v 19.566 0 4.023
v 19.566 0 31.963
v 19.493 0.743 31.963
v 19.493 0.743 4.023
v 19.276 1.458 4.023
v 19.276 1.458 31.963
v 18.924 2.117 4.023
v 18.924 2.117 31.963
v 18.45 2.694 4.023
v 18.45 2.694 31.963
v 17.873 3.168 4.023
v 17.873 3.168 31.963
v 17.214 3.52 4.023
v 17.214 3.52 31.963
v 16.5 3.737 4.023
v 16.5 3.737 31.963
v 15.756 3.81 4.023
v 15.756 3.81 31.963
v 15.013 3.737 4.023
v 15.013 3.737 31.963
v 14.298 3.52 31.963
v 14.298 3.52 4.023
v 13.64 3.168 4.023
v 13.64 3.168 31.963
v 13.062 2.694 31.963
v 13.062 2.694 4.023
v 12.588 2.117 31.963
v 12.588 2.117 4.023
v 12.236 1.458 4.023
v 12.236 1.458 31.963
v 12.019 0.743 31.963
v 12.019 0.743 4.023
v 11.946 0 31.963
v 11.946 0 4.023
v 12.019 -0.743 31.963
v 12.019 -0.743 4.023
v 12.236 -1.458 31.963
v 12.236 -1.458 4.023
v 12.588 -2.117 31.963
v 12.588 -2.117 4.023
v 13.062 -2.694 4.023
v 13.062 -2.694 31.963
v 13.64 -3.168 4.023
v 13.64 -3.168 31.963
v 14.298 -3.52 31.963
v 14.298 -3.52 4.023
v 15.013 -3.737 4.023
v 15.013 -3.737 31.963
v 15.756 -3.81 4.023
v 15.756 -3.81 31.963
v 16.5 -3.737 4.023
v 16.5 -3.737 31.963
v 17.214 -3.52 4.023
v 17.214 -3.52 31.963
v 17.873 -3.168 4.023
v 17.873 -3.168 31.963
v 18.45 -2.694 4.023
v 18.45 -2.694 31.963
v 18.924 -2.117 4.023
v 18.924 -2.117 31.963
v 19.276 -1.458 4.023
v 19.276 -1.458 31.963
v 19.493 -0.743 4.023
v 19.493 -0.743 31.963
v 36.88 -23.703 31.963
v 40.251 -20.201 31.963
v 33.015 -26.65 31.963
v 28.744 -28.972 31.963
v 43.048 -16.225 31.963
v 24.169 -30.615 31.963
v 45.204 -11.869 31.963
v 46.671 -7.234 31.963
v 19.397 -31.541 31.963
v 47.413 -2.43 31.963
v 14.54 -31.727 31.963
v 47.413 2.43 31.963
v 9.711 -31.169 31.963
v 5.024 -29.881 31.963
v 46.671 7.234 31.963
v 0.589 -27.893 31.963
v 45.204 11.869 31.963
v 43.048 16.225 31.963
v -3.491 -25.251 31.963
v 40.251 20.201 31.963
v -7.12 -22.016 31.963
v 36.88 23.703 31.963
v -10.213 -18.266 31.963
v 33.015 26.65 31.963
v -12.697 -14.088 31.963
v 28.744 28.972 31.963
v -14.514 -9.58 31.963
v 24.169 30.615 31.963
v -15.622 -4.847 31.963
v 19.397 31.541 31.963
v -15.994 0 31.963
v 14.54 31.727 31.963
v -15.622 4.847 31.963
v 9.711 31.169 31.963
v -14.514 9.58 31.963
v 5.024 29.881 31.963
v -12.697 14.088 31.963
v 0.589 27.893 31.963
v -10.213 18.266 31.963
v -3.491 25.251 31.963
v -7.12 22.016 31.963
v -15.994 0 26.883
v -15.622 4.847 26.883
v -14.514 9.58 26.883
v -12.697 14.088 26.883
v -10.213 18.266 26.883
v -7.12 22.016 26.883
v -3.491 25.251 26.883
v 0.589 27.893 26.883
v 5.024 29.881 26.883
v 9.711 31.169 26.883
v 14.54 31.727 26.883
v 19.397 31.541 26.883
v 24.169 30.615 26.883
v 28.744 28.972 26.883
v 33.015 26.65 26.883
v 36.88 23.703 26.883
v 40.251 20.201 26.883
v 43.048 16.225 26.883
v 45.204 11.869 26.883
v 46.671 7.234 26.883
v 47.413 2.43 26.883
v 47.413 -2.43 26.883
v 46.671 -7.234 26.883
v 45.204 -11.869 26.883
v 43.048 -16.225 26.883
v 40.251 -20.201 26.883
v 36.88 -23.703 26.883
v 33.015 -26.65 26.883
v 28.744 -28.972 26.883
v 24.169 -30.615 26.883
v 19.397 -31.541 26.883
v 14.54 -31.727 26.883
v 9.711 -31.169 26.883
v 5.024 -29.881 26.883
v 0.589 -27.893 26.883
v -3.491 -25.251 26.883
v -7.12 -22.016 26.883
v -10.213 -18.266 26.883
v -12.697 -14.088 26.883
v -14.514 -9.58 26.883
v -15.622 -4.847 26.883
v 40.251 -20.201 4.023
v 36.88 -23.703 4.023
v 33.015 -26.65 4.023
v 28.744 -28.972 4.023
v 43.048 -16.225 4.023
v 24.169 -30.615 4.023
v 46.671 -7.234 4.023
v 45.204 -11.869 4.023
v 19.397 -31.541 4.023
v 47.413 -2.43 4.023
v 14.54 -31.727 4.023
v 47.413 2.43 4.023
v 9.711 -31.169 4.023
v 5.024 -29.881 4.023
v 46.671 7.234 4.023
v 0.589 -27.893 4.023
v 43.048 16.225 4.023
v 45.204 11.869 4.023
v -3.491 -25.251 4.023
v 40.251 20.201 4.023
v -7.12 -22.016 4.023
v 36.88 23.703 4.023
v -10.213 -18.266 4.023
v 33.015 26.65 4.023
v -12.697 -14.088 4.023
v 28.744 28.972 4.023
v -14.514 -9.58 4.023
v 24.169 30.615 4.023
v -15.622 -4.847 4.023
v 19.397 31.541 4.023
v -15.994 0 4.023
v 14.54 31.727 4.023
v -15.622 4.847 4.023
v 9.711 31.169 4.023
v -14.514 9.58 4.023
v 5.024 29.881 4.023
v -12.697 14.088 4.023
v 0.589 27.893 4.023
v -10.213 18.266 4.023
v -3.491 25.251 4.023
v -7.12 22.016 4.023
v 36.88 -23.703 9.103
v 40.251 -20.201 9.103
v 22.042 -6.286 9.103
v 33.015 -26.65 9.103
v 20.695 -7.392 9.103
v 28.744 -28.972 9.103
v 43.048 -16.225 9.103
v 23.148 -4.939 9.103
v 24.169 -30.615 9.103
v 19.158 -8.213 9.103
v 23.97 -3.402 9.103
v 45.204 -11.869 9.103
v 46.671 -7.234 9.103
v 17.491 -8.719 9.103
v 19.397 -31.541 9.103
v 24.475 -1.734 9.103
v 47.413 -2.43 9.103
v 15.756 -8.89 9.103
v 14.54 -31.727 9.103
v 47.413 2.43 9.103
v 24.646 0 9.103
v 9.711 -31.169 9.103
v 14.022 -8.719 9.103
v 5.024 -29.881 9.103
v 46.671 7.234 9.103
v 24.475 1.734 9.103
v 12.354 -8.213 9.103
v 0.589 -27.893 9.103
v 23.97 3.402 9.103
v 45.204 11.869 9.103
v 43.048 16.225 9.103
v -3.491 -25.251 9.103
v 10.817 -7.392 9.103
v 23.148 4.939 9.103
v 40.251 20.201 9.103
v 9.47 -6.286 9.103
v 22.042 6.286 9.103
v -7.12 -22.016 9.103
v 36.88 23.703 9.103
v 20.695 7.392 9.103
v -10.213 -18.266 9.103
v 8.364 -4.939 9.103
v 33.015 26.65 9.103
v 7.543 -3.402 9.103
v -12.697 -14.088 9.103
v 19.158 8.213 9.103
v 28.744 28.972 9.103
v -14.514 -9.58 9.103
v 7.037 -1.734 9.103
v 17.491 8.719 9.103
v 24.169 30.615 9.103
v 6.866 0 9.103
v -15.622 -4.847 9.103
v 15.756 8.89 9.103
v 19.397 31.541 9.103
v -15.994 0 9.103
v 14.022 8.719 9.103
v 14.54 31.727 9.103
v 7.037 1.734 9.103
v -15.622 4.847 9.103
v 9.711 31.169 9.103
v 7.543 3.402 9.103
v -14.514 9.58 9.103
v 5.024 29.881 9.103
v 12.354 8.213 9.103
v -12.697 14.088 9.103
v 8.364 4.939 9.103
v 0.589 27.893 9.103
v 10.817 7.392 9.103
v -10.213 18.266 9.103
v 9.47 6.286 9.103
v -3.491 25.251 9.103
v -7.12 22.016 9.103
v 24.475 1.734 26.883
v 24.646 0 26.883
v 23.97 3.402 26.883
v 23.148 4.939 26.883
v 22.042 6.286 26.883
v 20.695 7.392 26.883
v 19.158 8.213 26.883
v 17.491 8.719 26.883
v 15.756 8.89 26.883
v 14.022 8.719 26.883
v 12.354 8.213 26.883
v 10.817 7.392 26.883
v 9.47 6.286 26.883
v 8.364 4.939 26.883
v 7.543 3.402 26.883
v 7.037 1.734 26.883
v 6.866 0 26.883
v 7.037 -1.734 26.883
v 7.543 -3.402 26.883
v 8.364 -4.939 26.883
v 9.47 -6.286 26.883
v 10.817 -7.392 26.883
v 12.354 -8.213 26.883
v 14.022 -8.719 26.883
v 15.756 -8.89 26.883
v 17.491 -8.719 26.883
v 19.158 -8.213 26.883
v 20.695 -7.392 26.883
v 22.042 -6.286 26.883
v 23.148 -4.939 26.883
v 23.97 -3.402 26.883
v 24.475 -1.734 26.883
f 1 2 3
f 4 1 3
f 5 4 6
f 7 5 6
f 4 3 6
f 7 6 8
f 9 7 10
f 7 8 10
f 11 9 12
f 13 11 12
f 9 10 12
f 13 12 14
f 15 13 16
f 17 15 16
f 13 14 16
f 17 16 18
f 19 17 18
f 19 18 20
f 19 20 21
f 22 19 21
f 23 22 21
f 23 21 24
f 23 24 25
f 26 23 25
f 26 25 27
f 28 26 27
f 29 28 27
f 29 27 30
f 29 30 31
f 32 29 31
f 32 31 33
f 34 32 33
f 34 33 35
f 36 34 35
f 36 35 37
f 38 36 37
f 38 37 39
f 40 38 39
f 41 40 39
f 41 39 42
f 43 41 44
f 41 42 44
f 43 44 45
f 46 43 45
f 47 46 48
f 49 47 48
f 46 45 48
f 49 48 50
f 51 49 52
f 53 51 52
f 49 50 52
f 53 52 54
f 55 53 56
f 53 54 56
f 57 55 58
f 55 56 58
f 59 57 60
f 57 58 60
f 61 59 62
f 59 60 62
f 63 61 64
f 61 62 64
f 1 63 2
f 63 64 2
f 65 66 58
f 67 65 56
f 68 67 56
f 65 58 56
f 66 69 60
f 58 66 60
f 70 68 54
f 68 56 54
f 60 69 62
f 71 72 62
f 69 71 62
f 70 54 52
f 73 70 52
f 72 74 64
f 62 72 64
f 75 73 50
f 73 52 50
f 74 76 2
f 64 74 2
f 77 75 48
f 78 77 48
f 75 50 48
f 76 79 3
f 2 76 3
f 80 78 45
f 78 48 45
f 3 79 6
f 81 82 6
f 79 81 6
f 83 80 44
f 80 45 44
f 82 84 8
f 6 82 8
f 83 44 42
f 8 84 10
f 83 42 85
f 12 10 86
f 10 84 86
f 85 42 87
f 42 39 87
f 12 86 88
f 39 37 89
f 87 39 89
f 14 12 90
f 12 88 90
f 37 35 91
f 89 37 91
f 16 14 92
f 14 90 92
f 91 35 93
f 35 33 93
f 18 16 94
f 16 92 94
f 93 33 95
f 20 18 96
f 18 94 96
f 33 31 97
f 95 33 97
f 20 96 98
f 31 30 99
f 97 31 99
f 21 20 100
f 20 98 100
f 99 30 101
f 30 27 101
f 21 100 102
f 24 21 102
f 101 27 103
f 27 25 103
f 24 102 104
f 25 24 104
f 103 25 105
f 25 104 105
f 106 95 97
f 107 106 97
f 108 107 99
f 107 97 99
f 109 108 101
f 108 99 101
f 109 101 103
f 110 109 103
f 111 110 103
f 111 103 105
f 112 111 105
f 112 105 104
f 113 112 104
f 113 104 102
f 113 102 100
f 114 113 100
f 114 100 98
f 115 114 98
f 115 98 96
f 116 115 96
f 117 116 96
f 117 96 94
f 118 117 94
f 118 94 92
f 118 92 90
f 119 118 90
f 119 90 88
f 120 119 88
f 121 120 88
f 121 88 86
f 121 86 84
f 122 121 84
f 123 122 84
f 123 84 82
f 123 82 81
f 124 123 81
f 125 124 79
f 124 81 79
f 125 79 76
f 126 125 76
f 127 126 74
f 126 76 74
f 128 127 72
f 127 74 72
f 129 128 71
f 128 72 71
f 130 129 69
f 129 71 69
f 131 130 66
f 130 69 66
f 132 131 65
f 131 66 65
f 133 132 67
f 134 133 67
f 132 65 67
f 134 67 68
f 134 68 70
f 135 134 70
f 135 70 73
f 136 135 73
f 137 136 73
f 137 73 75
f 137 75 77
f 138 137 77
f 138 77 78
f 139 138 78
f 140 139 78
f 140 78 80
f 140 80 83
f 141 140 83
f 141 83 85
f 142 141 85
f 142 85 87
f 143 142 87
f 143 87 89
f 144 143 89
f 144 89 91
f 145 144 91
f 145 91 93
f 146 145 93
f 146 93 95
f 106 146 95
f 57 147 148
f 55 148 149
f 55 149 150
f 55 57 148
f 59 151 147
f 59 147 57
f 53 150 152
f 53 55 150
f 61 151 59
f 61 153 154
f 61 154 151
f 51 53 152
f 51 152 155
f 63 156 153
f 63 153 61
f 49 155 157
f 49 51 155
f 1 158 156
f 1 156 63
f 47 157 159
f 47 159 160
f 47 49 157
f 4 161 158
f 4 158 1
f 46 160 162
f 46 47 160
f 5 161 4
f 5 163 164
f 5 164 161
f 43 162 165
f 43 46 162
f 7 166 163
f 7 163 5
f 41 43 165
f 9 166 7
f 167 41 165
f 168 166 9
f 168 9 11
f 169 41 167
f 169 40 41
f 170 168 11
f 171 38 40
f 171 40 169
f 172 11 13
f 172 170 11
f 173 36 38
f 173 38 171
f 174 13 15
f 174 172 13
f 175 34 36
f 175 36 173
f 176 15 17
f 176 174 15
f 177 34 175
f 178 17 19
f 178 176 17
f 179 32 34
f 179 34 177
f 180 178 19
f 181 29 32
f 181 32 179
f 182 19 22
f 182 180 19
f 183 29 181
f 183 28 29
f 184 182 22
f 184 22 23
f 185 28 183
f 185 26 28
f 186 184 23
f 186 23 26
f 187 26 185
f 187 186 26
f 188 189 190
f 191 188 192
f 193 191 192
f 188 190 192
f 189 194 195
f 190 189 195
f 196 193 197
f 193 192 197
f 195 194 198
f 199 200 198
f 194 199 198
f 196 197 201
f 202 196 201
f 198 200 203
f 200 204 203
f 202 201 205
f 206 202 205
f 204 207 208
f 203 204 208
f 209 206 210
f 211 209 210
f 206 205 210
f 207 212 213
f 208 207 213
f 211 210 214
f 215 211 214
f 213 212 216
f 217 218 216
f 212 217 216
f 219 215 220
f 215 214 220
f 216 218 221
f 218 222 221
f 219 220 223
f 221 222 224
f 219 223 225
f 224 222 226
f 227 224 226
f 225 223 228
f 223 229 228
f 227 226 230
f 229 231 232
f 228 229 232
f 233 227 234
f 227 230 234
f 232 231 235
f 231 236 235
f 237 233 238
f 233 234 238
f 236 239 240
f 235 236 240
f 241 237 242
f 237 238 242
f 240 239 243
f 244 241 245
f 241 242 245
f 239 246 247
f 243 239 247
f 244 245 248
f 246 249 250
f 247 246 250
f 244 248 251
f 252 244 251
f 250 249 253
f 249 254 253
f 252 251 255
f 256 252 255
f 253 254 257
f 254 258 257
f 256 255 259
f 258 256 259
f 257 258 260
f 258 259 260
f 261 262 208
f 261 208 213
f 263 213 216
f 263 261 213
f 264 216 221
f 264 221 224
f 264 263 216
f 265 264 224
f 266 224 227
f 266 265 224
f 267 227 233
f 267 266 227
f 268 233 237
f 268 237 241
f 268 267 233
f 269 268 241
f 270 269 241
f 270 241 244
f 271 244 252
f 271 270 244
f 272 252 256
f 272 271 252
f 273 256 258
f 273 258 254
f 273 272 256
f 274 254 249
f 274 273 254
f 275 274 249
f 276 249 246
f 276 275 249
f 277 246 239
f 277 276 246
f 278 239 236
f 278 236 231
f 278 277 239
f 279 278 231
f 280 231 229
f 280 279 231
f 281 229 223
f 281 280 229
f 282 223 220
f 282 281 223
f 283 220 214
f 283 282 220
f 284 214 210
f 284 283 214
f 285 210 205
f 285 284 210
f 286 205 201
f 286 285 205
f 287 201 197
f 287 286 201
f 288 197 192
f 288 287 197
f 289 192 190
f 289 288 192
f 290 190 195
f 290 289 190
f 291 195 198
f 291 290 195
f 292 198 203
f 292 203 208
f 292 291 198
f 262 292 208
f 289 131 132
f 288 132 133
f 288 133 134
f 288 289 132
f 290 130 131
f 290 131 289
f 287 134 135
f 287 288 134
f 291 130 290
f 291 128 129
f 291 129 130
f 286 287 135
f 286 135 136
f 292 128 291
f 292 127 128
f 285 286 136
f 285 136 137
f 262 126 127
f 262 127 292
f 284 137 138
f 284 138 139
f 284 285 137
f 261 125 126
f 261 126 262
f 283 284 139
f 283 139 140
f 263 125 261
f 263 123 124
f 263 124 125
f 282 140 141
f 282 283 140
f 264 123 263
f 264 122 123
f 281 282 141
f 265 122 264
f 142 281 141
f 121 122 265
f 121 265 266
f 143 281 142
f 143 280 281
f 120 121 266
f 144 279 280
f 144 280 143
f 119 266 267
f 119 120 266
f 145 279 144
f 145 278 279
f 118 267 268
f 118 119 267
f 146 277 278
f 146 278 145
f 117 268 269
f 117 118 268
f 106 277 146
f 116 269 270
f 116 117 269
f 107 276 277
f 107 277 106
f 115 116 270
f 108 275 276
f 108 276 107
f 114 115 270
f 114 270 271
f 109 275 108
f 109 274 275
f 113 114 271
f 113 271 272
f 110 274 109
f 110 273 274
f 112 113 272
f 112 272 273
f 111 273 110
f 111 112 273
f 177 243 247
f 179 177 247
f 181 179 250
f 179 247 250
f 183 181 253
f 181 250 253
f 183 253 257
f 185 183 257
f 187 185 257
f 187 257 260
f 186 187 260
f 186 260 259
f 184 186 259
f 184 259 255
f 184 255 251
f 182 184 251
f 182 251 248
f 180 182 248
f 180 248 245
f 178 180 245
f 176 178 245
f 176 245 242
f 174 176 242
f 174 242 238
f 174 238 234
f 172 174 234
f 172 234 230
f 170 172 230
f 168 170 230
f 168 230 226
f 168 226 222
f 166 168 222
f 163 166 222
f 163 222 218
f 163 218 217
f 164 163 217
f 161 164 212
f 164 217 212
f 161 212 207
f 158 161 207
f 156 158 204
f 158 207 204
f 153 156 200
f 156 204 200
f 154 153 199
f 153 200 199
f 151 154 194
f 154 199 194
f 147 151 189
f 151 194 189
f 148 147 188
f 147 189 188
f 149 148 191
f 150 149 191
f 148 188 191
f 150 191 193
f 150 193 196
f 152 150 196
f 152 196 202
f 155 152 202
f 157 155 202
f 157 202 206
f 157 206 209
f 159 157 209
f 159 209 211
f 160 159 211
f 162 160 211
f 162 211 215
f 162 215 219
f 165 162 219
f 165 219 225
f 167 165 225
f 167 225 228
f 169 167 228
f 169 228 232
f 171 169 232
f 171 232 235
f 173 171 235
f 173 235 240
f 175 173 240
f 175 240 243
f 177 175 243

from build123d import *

# Parameters (mm, degrees)
F0_W     = 31.75
F0_H     = 27.94
F2_R     = 3.81
F3_DEPTH = 70.2046528459
F4_T     = -5.08


with BuildPart() as f1:
    # F0 (on Front) → F1 (revolve)
    with BuildSketch(Plane.XZ):
        with Locations((-0.1187622547, 17.9933030483)):
            Rectangle(F0_W, F0_H)
    revolve(axis=Axis((15.7562377453, 0, 17.9933030483), (0, 0, -1)))

    # F2 (on face) → F3 (cut)
    with BuildSketch(Plane.XY.offset(31.9633030483)):
        with Locations((15.7562377453, 0)):
            Circle(F2_R)
    extrude(amount=-F3_DEPTH, mode=Mode.SUBTRACT)

    # F4
    f4_openings = [f1.faces().sort_by_distance(p)[0] for p in [
        (47.506238, 0, 17.993303),
    ]]
    offset(amount=F4_T, openings=f4_openings)


solid = f1.part
